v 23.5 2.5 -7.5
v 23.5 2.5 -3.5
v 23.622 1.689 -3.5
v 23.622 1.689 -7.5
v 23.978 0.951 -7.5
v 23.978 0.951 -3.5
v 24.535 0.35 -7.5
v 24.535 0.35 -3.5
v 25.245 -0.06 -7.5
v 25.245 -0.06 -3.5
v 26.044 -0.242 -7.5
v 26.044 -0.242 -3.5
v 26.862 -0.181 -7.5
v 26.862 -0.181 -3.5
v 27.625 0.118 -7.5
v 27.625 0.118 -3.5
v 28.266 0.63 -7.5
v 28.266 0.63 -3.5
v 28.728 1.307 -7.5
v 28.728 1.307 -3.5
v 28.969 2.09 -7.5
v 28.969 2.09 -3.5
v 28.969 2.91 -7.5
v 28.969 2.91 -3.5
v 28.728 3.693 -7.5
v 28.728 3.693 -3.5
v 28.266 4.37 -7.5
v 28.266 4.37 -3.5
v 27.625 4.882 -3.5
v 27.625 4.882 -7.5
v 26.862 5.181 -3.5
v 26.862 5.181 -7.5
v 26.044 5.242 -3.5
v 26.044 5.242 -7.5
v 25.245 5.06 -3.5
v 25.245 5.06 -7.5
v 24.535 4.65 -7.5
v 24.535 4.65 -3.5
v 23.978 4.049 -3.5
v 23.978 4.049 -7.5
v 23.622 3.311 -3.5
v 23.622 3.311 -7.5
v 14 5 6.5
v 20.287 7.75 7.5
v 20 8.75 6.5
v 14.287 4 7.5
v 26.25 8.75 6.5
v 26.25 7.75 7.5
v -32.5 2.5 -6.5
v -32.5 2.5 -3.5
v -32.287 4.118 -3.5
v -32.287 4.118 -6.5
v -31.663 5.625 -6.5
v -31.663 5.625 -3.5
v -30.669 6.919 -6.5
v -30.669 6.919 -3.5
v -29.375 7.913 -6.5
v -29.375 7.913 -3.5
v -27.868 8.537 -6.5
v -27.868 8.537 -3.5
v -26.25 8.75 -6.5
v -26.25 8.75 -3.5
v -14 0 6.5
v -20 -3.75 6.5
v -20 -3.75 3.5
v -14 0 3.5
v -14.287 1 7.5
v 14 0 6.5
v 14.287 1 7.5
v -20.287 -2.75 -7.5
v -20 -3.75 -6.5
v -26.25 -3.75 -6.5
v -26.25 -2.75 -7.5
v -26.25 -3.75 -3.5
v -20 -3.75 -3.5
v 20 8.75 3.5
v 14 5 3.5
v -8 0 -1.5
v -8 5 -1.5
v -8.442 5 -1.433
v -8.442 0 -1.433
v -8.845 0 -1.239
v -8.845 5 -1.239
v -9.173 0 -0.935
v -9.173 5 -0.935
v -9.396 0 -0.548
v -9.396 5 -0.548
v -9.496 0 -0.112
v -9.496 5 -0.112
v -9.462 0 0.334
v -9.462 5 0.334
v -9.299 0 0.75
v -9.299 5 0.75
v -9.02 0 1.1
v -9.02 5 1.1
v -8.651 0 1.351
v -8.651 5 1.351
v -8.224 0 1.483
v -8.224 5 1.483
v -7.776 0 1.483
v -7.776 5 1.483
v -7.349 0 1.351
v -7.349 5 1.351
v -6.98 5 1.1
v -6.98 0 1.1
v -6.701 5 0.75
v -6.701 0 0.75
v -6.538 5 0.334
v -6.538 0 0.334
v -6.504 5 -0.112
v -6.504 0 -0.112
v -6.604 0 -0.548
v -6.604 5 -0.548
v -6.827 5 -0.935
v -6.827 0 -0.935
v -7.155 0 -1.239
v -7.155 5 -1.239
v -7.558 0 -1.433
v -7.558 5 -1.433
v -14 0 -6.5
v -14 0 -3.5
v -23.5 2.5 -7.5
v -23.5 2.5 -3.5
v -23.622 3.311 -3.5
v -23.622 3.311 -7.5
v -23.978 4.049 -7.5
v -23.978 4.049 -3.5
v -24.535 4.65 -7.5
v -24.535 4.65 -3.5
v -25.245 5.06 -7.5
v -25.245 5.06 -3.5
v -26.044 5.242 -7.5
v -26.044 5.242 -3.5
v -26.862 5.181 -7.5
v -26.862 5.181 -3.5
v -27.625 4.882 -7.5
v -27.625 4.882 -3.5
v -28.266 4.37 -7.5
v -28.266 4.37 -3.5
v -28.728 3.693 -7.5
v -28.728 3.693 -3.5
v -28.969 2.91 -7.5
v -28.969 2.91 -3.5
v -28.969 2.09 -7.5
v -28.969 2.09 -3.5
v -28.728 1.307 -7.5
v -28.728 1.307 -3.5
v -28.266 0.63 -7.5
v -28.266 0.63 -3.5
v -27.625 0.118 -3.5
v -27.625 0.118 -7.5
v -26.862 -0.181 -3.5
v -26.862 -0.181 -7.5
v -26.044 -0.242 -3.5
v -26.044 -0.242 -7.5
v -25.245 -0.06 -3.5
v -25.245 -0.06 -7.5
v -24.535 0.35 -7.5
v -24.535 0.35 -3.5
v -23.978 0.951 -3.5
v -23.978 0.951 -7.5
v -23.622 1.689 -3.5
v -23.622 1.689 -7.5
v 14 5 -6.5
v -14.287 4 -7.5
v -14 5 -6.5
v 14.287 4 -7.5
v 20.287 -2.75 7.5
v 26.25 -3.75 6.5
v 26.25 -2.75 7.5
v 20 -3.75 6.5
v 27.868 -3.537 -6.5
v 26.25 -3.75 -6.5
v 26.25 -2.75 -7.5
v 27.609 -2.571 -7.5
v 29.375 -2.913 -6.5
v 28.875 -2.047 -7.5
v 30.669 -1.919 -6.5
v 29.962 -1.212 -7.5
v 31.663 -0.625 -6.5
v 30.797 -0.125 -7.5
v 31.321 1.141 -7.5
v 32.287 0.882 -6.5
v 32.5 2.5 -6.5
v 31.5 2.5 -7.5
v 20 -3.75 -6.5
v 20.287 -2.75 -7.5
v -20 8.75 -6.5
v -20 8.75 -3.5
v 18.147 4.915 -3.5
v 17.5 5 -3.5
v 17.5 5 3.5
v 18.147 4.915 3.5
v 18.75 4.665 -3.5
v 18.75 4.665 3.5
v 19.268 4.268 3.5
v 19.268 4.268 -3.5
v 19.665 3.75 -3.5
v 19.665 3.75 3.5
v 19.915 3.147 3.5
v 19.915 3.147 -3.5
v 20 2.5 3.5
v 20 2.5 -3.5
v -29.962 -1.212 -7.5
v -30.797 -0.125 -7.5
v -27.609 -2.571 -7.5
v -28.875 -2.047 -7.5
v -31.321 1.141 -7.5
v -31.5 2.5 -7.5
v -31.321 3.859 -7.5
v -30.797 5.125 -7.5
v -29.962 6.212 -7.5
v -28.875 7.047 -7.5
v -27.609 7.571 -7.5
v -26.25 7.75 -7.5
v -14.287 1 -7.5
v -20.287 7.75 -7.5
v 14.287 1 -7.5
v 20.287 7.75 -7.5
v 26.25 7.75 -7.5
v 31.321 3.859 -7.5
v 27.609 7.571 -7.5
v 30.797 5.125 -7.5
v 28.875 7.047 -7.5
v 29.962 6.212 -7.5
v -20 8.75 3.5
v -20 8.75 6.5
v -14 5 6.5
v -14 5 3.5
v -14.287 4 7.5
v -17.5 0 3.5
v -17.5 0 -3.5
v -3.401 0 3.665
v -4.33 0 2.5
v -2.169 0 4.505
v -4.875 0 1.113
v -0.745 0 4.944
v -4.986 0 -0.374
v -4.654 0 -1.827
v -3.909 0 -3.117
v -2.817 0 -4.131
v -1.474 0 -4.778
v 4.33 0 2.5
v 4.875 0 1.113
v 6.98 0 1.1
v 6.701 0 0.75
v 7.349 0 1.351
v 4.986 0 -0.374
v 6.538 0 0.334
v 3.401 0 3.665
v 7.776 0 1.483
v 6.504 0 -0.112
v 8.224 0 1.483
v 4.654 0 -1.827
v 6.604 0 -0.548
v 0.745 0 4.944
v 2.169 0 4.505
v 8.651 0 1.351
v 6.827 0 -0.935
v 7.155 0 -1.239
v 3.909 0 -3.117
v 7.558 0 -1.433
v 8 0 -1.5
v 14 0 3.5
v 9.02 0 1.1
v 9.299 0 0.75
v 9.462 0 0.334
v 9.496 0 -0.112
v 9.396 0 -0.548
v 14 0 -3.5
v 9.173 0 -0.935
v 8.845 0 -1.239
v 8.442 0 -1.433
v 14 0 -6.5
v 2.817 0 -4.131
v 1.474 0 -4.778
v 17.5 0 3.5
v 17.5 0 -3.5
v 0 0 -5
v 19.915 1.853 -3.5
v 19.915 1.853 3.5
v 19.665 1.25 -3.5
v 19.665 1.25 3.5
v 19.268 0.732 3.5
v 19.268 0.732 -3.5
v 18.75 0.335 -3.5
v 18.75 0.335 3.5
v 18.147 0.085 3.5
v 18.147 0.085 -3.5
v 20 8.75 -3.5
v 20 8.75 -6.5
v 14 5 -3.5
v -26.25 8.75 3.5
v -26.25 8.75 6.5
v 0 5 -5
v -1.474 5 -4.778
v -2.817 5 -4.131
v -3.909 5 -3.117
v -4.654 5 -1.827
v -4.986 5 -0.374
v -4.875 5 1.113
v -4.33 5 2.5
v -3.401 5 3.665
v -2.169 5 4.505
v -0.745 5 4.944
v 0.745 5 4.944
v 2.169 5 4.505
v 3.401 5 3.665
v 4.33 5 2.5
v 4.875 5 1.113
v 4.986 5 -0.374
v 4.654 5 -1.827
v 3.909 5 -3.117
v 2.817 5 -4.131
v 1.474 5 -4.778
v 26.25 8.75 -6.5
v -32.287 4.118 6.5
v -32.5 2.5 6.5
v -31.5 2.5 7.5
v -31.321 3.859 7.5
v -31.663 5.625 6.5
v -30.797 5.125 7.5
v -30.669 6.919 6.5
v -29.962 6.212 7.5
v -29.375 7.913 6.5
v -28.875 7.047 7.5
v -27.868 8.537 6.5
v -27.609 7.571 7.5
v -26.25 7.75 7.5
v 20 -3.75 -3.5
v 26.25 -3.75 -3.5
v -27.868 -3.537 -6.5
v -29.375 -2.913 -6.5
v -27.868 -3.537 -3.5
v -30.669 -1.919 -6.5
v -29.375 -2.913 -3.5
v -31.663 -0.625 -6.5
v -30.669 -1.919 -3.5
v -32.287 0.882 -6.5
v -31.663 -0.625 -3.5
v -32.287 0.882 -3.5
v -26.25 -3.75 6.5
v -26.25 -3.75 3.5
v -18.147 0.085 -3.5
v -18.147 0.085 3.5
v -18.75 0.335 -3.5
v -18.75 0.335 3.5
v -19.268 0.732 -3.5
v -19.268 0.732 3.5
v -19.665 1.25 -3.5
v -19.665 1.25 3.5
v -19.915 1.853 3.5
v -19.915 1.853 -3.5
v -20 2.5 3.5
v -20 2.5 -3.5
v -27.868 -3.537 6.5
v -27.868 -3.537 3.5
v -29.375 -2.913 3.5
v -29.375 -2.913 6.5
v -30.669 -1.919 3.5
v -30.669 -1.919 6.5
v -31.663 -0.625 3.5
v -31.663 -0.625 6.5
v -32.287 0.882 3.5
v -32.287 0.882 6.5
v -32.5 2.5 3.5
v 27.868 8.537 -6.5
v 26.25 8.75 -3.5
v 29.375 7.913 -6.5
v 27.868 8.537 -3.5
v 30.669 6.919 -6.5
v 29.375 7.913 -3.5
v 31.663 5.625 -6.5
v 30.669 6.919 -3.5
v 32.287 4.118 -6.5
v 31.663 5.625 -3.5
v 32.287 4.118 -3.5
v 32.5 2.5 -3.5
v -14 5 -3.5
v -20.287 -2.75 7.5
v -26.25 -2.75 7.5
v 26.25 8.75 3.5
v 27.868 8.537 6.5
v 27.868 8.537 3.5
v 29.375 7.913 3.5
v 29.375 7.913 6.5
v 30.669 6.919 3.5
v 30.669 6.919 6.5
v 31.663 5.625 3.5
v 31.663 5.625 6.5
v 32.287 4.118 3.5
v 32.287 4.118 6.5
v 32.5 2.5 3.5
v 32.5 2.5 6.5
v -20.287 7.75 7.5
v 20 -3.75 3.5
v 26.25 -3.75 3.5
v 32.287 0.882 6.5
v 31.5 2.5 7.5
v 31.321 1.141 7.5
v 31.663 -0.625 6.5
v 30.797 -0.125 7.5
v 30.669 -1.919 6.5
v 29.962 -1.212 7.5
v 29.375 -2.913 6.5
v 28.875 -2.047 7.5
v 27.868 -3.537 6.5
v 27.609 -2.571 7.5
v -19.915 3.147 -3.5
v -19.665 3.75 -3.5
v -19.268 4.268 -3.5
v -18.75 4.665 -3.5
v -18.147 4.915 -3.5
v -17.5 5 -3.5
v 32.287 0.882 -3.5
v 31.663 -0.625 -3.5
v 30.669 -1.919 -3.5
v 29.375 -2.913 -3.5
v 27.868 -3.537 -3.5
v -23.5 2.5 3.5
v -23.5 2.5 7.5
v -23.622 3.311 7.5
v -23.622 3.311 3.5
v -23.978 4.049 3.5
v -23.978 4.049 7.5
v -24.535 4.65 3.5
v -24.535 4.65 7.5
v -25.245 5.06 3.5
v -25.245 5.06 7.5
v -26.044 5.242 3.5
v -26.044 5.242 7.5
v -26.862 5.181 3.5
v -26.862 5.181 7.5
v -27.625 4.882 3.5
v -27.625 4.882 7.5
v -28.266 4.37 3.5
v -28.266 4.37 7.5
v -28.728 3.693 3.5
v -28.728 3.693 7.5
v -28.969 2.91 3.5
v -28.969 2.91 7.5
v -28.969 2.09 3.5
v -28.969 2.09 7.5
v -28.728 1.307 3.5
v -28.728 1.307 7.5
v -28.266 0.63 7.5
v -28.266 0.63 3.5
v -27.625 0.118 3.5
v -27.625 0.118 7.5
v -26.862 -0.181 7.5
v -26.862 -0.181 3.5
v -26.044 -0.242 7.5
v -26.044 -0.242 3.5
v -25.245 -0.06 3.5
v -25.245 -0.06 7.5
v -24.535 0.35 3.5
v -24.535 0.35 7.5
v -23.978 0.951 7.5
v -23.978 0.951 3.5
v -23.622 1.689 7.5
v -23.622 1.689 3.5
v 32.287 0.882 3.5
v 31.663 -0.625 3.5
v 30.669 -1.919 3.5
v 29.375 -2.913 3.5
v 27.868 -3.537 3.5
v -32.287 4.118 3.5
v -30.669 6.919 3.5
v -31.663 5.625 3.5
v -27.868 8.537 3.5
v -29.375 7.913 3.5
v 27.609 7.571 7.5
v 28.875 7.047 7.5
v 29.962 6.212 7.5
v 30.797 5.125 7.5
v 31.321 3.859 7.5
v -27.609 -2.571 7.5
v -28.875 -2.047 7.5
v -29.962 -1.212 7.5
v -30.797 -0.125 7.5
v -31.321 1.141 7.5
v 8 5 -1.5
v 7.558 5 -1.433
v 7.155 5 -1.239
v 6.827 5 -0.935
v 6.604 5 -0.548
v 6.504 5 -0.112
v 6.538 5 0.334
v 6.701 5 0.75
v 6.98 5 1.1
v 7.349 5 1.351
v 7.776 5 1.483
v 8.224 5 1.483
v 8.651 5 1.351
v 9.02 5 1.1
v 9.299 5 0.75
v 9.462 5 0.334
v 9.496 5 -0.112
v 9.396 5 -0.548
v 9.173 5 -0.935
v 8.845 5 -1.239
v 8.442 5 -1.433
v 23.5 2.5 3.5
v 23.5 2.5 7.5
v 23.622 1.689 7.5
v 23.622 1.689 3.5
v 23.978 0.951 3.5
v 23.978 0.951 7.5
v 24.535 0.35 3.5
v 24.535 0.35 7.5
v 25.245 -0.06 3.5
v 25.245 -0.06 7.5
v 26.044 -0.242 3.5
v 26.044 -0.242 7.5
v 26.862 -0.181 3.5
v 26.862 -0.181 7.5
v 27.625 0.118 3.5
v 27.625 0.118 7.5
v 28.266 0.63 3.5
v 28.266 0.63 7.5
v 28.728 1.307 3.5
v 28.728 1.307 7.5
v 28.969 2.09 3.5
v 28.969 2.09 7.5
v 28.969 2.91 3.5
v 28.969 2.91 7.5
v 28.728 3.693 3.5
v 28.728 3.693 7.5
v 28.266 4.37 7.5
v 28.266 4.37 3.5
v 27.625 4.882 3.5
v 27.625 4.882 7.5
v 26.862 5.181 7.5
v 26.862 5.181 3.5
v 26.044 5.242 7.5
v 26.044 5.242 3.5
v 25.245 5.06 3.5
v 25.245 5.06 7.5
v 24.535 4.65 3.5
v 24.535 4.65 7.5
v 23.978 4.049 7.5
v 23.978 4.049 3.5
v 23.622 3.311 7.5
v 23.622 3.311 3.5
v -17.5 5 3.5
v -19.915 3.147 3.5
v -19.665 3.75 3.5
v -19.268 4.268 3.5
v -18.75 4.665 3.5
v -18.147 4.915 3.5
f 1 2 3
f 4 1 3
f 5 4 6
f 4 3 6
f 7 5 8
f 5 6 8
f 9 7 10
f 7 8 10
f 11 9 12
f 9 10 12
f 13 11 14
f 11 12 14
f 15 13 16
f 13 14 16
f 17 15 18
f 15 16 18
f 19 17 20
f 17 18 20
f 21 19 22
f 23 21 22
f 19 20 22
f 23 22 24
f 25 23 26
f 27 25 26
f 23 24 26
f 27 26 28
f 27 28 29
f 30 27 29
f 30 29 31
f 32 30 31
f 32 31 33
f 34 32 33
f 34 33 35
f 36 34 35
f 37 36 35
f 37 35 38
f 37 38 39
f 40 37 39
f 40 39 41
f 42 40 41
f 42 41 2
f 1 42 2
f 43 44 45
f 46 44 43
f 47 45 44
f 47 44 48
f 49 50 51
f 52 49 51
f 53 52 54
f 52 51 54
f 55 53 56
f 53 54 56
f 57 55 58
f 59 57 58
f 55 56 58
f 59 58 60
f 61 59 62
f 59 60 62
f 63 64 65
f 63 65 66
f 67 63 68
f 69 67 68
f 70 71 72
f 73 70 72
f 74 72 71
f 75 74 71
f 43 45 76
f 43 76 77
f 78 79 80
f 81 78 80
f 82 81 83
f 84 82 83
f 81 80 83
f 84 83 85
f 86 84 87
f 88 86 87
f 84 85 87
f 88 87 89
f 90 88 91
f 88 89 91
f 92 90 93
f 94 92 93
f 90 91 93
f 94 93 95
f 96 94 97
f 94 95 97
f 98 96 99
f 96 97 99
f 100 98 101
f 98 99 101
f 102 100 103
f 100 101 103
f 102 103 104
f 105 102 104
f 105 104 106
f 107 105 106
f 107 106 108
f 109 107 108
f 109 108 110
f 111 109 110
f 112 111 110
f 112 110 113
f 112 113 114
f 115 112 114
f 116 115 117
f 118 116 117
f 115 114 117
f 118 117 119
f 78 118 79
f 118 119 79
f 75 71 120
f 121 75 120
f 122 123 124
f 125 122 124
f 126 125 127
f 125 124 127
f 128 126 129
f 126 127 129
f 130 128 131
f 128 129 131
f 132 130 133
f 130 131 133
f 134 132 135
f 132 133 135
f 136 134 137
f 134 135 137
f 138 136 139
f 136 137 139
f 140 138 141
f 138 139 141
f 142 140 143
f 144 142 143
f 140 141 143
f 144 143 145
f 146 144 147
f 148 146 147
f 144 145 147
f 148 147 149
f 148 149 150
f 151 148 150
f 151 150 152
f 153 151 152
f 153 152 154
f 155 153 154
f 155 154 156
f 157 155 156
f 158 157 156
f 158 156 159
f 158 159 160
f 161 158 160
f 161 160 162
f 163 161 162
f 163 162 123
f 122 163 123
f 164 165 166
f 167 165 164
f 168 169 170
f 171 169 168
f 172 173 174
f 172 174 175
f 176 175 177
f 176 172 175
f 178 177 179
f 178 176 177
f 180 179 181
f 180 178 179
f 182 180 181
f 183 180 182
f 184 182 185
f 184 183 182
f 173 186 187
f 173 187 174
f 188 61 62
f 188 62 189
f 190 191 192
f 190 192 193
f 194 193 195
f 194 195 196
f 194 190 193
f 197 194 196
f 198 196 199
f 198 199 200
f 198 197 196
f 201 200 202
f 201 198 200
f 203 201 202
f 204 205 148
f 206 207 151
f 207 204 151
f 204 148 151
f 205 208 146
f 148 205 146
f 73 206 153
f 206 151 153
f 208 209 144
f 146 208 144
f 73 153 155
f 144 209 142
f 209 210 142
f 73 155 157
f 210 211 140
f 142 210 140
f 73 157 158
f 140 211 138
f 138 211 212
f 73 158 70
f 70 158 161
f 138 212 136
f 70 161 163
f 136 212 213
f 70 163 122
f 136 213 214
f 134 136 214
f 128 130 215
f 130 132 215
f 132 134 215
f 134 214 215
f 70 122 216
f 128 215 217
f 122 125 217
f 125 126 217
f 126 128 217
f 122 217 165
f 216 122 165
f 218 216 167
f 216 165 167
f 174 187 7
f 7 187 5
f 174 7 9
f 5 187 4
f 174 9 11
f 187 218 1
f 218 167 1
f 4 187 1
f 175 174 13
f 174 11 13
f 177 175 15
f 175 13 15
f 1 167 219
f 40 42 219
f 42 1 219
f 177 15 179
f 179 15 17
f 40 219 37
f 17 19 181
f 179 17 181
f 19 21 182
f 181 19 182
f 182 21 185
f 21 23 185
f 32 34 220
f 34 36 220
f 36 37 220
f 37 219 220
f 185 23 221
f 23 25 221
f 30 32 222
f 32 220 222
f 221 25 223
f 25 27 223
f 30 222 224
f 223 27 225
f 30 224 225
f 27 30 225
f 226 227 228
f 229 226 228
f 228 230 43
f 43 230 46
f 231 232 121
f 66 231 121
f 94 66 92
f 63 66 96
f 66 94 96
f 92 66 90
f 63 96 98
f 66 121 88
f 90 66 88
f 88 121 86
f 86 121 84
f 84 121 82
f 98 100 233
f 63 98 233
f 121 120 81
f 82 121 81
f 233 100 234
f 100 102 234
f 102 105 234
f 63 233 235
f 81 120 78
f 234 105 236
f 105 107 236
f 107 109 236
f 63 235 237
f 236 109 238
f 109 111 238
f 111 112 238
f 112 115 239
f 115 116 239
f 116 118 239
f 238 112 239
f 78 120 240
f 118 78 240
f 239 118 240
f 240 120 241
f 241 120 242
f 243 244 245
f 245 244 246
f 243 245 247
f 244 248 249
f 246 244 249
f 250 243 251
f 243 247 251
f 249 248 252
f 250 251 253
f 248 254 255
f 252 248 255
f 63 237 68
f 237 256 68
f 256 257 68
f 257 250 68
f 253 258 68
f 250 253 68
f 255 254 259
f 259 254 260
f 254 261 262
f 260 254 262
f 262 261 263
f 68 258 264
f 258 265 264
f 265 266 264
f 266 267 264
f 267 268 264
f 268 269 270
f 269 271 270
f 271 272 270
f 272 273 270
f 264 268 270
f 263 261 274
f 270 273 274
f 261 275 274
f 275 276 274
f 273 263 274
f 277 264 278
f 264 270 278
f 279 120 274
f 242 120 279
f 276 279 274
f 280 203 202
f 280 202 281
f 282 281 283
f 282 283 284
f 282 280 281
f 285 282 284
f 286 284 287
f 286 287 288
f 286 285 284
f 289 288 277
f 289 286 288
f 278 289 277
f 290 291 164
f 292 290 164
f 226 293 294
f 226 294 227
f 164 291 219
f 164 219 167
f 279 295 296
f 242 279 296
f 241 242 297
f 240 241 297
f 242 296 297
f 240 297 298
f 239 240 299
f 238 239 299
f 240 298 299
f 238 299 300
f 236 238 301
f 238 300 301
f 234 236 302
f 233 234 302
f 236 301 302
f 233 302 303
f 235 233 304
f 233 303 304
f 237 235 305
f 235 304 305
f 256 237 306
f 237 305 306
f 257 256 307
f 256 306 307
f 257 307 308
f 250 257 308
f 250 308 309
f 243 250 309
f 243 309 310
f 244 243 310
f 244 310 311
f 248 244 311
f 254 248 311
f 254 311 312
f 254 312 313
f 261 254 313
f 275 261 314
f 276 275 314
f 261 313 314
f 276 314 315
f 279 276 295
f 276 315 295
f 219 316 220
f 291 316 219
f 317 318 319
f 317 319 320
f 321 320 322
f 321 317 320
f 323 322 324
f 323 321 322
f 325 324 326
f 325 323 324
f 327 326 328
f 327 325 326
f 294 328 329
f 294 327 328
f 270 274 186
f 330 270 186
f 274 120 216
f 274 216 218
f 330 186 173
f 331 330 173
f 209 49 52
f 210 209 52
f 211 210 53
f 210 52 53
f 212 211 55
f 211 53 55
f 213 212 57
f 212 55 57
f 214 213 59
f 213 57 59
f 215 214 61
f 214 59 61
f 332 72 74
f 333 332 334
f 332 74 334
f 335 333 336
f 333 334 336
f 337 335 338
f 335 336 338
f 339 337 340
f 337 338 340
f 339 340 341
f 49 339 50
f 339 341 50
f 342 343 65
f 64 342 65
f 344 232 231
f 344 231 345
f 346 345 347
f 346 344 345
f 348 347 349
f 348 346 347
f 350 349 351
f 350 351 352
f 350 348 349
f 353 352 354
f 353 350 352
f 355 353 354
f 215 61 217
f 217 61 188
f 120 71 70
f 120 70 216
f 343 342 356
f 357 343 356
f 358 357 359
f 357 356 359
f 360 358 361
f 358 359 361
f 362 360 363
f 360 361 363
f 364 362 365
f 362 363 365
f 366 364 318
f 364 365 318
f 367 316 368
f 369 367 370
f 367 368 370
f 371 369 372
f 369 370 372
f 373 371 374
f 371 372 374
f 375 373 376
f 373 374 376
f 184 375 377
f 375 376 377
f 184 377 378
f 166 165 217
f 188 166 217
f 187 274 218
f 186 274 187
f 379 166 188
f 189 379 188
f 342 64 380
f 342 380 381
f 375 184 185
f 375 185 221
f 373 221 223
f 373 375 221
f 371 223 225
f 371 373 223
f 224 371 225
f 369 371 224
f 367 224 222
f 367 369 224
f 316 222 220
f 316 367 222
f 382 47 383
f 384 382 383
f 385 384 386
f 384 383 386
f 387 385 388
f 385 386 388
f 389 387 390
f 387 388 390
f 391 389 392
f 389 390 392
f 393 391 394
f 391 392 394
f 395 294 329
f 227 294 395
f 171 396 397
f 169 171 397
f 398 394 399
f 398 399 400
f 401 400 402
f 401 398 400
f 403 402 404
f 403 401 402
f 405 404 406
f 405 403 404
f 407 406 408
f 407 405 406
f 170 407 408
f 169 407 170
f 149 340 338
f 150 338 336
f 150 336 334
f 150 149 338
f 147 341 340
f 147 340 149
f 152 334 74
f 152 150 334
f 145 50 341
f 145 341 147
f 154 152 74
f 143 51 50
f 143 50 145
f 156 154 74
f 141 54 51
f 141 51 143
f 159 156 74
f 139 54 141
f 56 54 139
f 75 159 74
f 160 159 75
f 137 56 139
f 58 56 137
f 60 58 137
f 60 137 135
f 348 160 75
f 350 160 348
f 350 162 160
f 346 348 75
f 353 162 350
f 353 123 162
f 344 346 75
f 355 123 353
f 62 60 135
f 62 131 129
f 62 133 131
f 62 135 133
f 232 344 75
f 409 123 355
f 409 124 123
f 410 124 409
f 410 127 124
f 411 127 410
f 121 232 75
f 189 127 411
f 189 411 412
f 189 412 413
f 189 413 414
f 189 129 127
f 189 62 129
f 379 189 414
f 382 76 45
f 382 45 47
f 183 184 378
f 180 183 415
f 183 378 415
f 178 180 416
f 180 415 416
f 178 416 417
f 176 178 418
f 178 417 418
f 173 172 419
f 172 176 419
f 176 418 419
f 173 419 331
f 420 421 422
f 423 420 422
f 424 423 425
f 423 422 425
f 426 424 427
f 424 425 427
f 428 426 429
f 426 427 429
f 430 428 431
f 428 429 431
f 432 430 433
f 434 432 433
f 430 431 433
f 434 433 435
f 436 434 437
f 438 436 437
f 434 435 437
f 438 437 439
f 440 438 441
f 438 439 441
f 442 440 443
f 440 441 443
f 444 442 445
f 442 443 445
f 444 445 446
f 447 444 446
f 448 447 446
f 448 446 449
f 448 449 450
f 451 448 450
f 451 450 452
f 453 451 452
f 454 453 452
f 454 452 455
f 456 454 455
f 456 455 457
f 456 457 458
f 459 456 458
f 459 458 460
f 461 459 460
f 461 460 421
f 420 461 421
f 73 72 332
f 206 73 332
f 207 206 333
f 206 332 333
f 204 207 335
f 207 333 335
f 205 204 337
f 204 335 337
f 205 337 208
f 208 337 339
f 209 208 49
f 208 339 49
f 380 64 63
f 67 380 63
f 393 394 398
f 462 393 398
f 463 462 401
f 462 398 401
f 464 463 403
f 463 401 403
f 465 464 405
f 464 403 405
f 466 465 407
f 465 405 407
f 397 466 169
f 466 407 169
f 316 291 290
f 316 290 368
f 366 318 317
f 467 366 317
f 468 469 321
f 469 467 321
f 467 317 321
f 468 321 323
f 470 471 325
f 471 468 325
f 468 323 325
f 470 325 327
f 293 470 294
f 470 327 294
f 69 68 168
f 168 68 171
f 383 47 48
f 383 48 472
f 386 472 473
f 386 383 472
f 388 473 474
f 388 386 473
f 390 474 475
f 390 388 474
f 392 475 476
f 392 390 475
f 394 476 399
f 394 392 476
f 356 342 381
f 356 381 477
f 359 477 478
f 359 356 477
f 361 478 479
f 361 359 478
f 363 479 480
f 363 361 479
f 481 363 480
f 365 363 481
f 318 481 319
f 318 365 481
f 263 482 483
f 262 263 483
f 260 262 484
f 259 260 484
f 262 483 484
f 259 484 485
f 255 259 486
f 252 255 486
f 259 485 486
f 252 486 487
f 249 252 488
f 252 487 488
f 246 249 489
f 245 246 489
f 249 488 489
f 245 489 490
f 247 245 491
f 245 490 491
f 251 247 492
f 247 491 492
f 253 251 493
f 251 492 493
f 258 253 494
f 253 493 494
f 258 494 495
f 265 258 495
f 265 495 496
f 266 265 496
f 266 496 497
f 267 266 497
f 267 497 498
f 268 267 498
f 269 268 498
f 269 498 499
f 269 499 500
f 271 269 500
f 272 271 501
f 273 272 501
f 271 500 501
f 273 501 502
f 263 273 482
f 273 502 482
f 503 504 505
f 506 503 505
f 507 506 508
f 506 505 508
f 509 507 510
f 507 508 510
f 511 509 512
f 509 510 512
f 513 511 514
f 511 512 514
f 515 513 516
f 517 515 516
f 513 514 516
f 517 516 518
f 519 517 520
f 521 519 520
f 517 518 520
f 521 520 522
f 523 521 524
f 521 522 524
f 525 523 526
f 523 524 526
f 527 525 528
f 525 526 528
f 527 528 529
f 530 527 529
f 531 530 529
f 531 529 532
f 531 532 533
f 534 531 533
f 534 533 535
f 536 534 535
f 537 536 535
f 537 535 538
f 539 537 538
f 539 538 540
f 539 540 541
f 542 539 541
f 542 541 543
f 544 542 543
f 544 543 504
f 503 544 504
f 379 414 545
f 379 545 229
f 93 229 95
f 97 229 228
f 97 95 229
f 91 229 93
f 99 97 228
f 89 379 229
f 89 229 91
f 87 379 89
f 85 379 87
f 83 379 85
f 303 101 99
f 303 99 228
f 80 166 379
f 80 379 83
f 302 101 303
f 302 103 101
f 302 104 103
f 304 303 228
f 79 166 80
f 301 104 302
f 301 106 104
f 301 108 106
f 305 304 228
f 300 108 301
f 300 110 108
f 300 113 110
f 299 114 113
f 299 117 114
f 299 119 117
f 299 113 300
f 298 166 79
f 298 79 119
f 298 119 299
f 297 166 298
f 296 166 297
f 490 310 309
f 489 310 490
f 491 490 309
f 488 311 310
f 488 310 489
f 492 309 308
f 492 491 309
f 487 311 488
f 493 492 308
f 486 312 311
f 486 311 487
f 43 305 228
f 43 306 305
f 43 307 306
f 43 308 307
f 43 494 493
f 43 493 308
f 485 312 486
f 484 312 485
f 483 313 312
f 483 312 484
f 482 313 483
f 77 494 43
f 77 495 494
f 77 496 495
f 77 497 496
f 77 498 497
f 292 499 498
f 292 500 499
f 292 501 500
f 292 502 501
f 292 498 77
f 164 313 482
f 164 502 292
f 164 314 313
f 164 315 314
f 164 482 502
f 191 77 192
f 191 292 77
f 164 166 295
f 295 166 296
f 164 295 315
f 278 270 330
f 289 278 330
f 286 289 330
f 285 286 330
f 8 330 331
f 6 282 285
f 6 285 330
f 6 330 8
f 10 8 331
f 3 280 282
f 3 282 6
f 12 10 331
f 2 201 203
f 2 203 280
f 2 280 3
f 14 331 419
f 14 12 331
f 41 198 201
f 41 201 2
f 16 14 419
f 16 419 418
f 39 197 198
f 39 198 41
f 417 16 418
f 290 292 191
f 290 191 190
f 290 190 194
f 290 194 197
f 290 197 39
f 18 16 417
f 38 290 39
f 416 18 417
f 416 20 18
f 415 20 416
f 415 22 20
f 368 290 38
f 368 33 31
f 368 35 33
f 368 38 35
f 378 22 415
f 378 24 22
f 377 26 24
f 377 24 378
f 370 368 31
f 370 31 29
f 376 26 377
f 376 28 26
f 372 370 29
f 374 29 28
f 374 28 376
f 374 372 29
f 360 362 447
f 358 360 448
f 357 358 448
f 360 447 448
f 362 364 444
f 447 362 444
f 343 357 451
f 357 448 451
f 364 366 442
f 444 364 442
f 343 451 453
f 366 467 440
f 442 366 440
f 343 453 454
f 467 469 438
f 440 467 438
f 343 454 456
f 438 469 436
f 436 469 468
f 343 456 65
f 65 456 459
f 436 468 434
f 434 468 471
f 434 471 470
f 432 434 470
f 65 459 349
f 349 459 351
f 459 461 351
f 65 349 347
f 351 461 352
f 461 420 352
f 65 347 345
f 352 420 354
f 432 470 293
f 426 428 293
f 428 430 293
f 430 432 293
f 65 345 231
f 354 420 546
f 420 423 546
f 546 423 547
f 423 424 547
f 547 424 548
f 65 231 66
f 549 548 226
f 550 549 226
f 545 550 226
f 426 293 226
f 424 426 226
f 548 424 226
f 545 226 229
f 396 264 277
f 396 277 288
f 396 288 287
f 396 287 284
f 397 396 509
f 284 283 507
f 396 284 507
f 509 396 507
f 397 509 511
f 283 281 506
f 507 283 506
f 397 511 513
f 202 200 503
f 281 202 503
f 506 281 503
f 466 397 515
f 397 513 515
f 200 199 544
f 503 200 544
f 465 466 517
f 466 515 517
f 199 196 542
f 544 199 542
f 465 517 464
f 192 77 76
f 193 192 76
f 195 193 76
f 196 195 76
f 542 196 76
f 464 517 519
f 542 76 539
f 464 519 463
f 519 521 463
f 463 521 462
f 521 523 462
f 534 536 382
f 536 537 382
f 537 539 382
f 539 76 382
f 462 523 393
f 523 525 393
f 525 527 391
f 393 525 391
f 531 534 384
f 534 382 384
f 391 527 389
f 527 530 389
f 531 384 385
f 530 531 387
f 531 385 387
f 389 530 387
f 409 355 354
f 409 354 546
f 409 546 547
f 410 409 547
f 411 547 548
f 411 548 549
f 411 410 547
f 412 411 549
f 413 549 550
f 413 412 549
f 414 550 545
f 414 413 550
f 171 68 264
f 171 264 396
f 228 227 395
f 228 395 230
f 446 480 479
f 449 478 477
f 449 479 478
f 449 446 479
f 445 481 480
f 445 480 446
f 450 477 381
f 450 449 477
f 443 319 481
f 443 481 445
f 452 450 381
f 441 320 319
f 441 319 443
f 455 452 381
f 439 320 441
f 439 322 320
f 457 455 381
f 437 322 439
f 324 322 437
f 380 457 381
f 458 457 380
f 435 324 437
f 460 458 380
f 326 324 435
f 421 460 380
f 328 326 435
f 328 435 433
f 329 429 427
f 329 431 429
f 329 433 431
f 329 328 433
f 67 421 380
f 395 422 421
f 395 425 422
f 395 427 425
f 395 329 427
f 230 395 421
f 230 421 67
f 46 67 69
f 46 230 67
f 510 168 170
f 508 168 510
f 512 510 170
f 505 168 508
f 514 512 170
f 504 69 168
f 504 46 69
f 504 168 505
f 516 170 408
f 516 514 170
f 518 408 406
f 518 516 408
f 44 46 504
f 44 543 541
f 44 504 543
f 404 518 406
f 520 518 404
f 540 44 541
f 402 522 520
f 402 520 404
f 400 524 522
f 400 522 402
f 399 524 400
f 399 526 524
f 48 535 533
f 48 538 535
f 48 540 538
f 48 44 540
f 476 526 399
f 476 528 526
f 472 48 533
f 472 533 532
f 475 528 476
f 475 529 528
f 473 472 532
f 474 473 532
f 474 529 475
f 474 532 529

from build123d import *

# Parameters (mm, degrees)
SKETCH_1_W           = 40
SKETCH_1_H           = 15
EXTRUDE_1_DEPTH      = 5
CUT_EXTRUDE_START    = 5
SKETCH_2_R           = 5
SKETCH_2_R_2         = 1.5
CUT_EXTRUDE_1_DEPTH  = 5
EXTRUDE_3_DEPTH      = 8.75
EXTRUDE_3_DEPTH_BACK = 3.75
SKETCH_6_W           = 12.5
SKETCH_6_H           = 4
EXTRUDE_START        = 7.5
EXTRUDE_4_DEPTH      = 4
EXTRUDE_START_2      = -7.5
EXTRUDE_5_DEPTH      = 4
CUT_EXTRUDE_START_2  = 7.5
SKETCH_10_R          = 2.75
CUT_EXTRUDE_3_DEPTH  = 15
CUT_EXTRUDE_START_3  = -3.5
CUT_EXTRUDE_4_DEPTH  = 7
CHAMFER_1_SIZE       = 1


with BuildPart() as part:
    # 草图1 → 凸台-拉伸1 (new body)
    with BuildSketch(Plane(origin=(0, 0, 0), x_dir=(1, 0, 0), z_dir=(0, 1, 0))):
        Rectangle(SKETCH_1_W, SKETCH_1_H)
    extrude(amount=EXTRUDE_1_DEPTH)

    # 草图2 → 切除-拉伸1 (cut)
    with BuildSketch(Plane(origin=(0, 0, 0), x_dir=(1, 0, 0), z_dir=(0, 1, 0)).offset(CUT_EXTRUDE_START)):
        with Locations(Location((0, 0, 0), (0, 0, 90))):
            Circle(SKETCH_2_R)
        with Locations(Location((8, 0, 0), (0, 0, 90))):
            Circle(SKETCH_2_R_2)
        with Locations(Location((-8, 0, 0), (0, 0, 90))):
            Circle(SKETCH_2_R_2)
    extrude(amount=-CUT_EXTRUDE_1_DEPTH, mode=Mode.SUBTRACT)

    # 草图6 → 凸台-拉伸3 (add, two sides: drawn at the far end of the back side and taken through both)
    with BuildSketch(Plane(origin=(0, 0, 0), x_dir=(1, 0, 0), z_dir=(0, 1, 0)).offset(-EXTRUDE_3_DEPTH_BACK)):
        with Locations((26.25, 5.5)):
            Rectangle(SKETCH_6_W, SKETCH_6_H)
        with Locations((26.25, -5.5)):
            Rectangle(SKETCH_6_W, SKETCH_6_H)
        with Locations((-26.25, -5.5)):
            Rectangle(SKETCH_6_W, SKETCH_6_H)
        with Locations((-26.25, 5.5)):
            Rectangle(SKETCH_6_W, SKETCH_6_H)
    extrude(amount=EXTRUDE_3_DEPTH + EXTRUDE_3_DEPTH_BACK)

    # 草图8 → 凸台-拉伸4 (add)
    with BuildSketch(Plane.XY.offset(EXTRUDE_START)):
        Polygon((-20, -3.75), (-14, 0), (-20, 0), align=None)
        Polygon((-20, 8.75), (-14, 5), (-20, 5), align=None)
        Polygon((20, 0), (14, 0), (20, -3.75), align=None)
        Polygon((20, 5), (20, 8.75), (14, 5), align=None)
    extrude(amount=-EXTRUDE_4_DEPTH)

    # 草图9 → 凸台-拉伸5 (add)
    with BuildSketch(Plane.XY.offset(EXTRUDE_START_2)):
        Polygon((-14, 5), (-20, 8.75), (-20, 5), align=None)
        Polygon((-20, -3.75), (-14, 0), (-20, 0), align=None)
        Polygon((20, 5), (20, 8.75), (14, 5), align=None)
        Polygon((20, 0), (14, 0), (20, -3.75), align=None)
    extrude(amount=EXTRUDE_5_DEPTH)

    # 草图10 → 切除-拉伸3 (cut)
    with BuildSketch(Plane.XY.offset(CUT_EXTRUDE_START_2)):
        with BuildLine():
            Line((-32.5, 2.5), (-32.5, -3.75))
            Line((-32.5, -3.75), (-26.25, -3.75))
            ThreePointArc((-26.25, -3.75), (-30.669417382, -1.919417382), (-32.5, 2.5))
        make_face()
        with BuildLine():
            Line((-32.5, 8.75), (-32.5, 2.5))
            ThreePointArc((-32.5, 2.5), (-30.669417382, 6.919417382), (-26.25, 8.75))
            Line((-26.25, 8.75), (-32.5, 8.75))
        make_face()
        with Locations(Location((26.25, 2.5, 0), (0, 0, 180))):
            Circle(SKETCH_10_R)
        with BuildLine():
            ThreePointArc((32.5, 2.5), (30.669417382, -1.919417382), (26.25, -3.75))
            Line((26.25, -3.75), (32.5, -3.75))
            Line((32.5, -3.75), (32.5, 2.5))
        make_face()
        with BuildLine():
            ThreePointArc((26.25, 8.75), (30.669417382, 6.919417382), (32.5, 2.5))
            Line((32.5, 2.5), (32.5, 8.75))
            Line((32.5, 8.75), (26.25, 8.75))
        make_face()
        with Locations((-26.25, 2.5)):
            Circle(SKETCH_10_R)
    extrude(amount=-CUT_EXTRUDE_3_DEPTH, mode=Mode.SUBTRACT)

    # 草图11 → 切除-拉伸4 (cut)
    with BuildSketch(Plane.XY.offset(CUT_EXTRUDE_START_3)):
        with BuildLine():
            Line((20, 2.5), (20, 5))
            Line((20, 5), (17.5, 5))
            ThreePointArc((17.5, 5), (19.267766953, 4.267766953), (20, 2.5))
        make_face()
        with BuildLine():
            Line((20, 0), (20, 2.5))
            ThreePointArc((20, 2.5), (19.267766953, 0.732233047), (17.5, 0))
            Line((17.5, 0), (20, 0))
        make_face()
        with BuildLine():
            Line((-20, 0), (-17.5, 0))
            ThreePointArc((-17.5, 0), (-19.267766948, 0.732233042), (-20, 2.499999987))
            Line((-20, 2.499999987), (-20, 0))
        make_face()
        with BuildLine():
            Line((-20, 5), (-20, 2.499999987))
            ThreePointArc((-20, 2.499999987), (-19.267766958, 4.267766948), (-17.5, 5))
            Line((-17.5, 5), (-20, 5))
        make_face()
    extrude(amount=CUT_EXTRUDE_4_DEPTH, mode=Mode.SUBTRACT)

    # 倒角1
    chamfer_1_edges = [part.edges().sort_by_distance(p)[0] for p in [
        (17, -1.875, 7.5),
        (17, 6.875, 7.5),
        (-17, 6.875, -7.5),
        (-17, -1.875, -7.5),
        (0, 5, -7.5),
        (17, 6.875, -7.5),
        (0, 0, -7.5),
        (17, -1.875, -7.5),
        (-23.125, 8.75, 7.5),
        (23.125, -3.75, -7.5),
        (32.5, 2.5, 7.5),
        (32.5, 2.5, -7.5),
        (-32.5, 2.5, 7.5),
        (-32.5, 2.5, -7.5),
        (-23.125, -3.75, 7.5),
        (23.125, 8.75, -7.5),
        (23.125, -3.75, 7.5),
        (23.125, 8.75, 7.5),
        (-23.125, -3.75, -7.5),
        (-23.125, 8.75, -7.5),
        (0, 0, 7.5),
        (-17, -1.875, 7.5),
        (0, 5, 7.5),
        (-17, 6.875, 7.5),
    ]]
    chamfer(chamfer_1_edges, length=CHAMFER_1_SIZE)


solid = part.part
